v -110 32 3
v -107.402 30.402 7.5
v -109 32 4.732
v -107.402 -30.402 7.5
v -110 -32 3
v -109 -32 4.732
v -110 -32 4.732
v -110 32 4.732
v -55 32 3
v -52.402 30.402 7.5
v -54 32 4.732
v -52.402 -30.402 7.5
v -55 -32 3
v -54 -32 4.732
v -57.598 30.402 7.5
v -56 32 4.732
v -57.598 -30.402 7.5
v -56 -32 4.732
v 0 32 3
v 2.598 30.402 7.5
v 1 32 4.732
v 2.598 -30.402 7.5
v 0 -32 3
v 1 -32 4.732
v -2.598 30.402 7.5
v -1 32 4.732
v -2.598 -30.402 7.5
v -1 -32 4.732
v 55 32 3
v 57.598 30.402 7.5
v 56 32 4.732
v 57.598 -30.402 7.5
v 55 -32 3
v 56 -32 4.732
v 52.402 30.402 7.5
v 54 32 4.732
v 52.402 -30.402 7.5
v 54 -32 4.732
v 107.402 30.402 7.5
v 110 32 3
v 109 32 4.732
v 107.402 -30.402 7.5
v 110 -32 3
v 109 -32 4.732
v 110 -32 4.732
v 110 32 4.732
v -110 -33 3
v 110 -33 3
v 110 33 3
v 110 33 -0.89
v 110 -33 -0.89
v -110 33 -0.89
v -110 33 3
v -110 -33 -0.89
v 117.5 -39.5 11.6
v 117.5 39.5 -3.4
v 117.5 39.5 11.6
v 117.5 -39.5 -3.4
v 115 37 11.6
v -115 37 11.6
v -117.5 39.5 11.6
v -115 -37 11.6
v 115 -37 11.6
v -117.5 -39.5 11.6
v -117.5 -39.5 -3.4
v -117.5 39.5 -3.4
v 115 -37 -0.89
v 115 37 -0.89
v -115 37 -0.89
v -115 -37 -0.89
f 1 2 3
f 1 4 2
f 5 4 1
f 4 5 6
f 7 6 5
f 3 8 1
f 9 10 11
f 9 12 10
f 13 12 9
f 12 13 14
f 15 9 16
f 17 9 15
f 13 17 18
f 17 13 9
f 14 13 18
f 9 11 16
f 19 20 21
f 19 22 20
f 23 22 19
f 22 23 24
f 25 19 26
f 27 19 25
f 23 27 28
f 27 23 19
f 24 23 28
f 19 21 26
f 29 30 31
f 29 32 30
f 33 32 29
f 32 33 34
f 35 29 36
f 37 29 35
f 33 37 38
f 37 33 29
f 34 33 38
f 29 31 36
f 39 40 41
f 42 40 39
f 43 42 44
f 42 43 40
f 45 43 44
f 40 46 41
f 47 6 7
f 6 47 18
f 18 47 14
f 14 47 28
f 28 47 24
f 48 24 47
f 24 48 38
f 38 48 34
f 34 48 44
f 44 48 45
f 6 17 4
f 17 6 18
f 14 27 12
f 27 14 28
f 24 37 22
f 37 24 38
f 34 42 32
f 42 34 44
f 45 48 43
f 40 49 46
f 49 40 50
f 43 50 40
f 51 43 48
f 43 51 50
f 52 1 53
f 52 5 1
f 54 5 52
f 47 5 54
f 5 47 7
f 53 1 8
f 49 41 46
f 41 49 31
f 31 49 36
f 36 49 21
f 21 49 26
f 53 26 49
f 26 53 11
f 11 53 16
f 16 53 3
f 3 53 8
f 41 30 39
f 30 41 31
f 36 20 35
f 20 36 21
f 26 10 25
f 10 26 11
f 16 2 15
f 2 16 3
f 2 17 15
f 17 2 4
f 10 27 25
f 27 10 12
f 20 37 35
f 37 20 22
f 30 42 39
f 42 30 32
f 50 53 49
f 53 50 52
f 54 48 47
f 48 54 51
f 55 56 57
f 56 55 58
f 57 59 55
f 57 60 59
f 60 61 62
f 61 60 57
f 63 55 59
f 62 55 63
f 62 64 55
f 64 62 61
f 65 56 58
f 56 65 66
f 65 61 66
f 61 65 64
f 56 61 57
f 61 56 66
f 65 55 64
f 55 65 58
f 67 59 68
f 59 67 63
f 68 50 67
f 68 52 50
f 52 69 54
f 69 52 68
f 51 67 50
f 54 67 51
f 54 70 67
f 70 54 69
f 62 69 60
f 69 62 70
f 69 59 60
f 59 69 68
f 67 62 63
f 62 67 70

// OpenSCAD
use <../Write.scad>

module chaosknoten(){
	translate([5.7,-6,1.6]) scale([7,7,1]) rotate([0,0,90])
		linear_extrude(height = 1, center = true, convexity = 10)
		import (file = "chaosknoten.dxf");
}

module tafel(){
	difference() {
		translate([0,0,2.75]) cube([4*55,66,9.5], center=true);
		for (i = [-2:2]){
			translate([i*55,0,8]) rotate([90,90,0]) cylinder(h=64, r=5, center=true, $fn=3);
		}
		for (i = [-1,1]){
			translate([0,i*33,8]) rotate([0,90,0]) cylinder(h=4*55, r=5, center=true, $fn=3);
		}
	}
	for (i = [-1:2]){
		translate([i*55-15,-20,6]) chaosknoten();
	}
}

module giessform(){
	translate([0,0,4.1]) difference() {
		cube([4*55+15,64+15,15], center=true);
		translate([0,0,1.26]) cube([4*55+10,64+10,12.5], center=true);
	}
	translate([100,35,-1]) scale([0.8,0.8,1])
		rotate([-90,180,0]) writecube("CCCD v1.1", [0,0,0], 0);
}

module alles(gf){
	union(){
		tafel();
		if (gf){
			giessform();
		}
	}
}


alles(true);
